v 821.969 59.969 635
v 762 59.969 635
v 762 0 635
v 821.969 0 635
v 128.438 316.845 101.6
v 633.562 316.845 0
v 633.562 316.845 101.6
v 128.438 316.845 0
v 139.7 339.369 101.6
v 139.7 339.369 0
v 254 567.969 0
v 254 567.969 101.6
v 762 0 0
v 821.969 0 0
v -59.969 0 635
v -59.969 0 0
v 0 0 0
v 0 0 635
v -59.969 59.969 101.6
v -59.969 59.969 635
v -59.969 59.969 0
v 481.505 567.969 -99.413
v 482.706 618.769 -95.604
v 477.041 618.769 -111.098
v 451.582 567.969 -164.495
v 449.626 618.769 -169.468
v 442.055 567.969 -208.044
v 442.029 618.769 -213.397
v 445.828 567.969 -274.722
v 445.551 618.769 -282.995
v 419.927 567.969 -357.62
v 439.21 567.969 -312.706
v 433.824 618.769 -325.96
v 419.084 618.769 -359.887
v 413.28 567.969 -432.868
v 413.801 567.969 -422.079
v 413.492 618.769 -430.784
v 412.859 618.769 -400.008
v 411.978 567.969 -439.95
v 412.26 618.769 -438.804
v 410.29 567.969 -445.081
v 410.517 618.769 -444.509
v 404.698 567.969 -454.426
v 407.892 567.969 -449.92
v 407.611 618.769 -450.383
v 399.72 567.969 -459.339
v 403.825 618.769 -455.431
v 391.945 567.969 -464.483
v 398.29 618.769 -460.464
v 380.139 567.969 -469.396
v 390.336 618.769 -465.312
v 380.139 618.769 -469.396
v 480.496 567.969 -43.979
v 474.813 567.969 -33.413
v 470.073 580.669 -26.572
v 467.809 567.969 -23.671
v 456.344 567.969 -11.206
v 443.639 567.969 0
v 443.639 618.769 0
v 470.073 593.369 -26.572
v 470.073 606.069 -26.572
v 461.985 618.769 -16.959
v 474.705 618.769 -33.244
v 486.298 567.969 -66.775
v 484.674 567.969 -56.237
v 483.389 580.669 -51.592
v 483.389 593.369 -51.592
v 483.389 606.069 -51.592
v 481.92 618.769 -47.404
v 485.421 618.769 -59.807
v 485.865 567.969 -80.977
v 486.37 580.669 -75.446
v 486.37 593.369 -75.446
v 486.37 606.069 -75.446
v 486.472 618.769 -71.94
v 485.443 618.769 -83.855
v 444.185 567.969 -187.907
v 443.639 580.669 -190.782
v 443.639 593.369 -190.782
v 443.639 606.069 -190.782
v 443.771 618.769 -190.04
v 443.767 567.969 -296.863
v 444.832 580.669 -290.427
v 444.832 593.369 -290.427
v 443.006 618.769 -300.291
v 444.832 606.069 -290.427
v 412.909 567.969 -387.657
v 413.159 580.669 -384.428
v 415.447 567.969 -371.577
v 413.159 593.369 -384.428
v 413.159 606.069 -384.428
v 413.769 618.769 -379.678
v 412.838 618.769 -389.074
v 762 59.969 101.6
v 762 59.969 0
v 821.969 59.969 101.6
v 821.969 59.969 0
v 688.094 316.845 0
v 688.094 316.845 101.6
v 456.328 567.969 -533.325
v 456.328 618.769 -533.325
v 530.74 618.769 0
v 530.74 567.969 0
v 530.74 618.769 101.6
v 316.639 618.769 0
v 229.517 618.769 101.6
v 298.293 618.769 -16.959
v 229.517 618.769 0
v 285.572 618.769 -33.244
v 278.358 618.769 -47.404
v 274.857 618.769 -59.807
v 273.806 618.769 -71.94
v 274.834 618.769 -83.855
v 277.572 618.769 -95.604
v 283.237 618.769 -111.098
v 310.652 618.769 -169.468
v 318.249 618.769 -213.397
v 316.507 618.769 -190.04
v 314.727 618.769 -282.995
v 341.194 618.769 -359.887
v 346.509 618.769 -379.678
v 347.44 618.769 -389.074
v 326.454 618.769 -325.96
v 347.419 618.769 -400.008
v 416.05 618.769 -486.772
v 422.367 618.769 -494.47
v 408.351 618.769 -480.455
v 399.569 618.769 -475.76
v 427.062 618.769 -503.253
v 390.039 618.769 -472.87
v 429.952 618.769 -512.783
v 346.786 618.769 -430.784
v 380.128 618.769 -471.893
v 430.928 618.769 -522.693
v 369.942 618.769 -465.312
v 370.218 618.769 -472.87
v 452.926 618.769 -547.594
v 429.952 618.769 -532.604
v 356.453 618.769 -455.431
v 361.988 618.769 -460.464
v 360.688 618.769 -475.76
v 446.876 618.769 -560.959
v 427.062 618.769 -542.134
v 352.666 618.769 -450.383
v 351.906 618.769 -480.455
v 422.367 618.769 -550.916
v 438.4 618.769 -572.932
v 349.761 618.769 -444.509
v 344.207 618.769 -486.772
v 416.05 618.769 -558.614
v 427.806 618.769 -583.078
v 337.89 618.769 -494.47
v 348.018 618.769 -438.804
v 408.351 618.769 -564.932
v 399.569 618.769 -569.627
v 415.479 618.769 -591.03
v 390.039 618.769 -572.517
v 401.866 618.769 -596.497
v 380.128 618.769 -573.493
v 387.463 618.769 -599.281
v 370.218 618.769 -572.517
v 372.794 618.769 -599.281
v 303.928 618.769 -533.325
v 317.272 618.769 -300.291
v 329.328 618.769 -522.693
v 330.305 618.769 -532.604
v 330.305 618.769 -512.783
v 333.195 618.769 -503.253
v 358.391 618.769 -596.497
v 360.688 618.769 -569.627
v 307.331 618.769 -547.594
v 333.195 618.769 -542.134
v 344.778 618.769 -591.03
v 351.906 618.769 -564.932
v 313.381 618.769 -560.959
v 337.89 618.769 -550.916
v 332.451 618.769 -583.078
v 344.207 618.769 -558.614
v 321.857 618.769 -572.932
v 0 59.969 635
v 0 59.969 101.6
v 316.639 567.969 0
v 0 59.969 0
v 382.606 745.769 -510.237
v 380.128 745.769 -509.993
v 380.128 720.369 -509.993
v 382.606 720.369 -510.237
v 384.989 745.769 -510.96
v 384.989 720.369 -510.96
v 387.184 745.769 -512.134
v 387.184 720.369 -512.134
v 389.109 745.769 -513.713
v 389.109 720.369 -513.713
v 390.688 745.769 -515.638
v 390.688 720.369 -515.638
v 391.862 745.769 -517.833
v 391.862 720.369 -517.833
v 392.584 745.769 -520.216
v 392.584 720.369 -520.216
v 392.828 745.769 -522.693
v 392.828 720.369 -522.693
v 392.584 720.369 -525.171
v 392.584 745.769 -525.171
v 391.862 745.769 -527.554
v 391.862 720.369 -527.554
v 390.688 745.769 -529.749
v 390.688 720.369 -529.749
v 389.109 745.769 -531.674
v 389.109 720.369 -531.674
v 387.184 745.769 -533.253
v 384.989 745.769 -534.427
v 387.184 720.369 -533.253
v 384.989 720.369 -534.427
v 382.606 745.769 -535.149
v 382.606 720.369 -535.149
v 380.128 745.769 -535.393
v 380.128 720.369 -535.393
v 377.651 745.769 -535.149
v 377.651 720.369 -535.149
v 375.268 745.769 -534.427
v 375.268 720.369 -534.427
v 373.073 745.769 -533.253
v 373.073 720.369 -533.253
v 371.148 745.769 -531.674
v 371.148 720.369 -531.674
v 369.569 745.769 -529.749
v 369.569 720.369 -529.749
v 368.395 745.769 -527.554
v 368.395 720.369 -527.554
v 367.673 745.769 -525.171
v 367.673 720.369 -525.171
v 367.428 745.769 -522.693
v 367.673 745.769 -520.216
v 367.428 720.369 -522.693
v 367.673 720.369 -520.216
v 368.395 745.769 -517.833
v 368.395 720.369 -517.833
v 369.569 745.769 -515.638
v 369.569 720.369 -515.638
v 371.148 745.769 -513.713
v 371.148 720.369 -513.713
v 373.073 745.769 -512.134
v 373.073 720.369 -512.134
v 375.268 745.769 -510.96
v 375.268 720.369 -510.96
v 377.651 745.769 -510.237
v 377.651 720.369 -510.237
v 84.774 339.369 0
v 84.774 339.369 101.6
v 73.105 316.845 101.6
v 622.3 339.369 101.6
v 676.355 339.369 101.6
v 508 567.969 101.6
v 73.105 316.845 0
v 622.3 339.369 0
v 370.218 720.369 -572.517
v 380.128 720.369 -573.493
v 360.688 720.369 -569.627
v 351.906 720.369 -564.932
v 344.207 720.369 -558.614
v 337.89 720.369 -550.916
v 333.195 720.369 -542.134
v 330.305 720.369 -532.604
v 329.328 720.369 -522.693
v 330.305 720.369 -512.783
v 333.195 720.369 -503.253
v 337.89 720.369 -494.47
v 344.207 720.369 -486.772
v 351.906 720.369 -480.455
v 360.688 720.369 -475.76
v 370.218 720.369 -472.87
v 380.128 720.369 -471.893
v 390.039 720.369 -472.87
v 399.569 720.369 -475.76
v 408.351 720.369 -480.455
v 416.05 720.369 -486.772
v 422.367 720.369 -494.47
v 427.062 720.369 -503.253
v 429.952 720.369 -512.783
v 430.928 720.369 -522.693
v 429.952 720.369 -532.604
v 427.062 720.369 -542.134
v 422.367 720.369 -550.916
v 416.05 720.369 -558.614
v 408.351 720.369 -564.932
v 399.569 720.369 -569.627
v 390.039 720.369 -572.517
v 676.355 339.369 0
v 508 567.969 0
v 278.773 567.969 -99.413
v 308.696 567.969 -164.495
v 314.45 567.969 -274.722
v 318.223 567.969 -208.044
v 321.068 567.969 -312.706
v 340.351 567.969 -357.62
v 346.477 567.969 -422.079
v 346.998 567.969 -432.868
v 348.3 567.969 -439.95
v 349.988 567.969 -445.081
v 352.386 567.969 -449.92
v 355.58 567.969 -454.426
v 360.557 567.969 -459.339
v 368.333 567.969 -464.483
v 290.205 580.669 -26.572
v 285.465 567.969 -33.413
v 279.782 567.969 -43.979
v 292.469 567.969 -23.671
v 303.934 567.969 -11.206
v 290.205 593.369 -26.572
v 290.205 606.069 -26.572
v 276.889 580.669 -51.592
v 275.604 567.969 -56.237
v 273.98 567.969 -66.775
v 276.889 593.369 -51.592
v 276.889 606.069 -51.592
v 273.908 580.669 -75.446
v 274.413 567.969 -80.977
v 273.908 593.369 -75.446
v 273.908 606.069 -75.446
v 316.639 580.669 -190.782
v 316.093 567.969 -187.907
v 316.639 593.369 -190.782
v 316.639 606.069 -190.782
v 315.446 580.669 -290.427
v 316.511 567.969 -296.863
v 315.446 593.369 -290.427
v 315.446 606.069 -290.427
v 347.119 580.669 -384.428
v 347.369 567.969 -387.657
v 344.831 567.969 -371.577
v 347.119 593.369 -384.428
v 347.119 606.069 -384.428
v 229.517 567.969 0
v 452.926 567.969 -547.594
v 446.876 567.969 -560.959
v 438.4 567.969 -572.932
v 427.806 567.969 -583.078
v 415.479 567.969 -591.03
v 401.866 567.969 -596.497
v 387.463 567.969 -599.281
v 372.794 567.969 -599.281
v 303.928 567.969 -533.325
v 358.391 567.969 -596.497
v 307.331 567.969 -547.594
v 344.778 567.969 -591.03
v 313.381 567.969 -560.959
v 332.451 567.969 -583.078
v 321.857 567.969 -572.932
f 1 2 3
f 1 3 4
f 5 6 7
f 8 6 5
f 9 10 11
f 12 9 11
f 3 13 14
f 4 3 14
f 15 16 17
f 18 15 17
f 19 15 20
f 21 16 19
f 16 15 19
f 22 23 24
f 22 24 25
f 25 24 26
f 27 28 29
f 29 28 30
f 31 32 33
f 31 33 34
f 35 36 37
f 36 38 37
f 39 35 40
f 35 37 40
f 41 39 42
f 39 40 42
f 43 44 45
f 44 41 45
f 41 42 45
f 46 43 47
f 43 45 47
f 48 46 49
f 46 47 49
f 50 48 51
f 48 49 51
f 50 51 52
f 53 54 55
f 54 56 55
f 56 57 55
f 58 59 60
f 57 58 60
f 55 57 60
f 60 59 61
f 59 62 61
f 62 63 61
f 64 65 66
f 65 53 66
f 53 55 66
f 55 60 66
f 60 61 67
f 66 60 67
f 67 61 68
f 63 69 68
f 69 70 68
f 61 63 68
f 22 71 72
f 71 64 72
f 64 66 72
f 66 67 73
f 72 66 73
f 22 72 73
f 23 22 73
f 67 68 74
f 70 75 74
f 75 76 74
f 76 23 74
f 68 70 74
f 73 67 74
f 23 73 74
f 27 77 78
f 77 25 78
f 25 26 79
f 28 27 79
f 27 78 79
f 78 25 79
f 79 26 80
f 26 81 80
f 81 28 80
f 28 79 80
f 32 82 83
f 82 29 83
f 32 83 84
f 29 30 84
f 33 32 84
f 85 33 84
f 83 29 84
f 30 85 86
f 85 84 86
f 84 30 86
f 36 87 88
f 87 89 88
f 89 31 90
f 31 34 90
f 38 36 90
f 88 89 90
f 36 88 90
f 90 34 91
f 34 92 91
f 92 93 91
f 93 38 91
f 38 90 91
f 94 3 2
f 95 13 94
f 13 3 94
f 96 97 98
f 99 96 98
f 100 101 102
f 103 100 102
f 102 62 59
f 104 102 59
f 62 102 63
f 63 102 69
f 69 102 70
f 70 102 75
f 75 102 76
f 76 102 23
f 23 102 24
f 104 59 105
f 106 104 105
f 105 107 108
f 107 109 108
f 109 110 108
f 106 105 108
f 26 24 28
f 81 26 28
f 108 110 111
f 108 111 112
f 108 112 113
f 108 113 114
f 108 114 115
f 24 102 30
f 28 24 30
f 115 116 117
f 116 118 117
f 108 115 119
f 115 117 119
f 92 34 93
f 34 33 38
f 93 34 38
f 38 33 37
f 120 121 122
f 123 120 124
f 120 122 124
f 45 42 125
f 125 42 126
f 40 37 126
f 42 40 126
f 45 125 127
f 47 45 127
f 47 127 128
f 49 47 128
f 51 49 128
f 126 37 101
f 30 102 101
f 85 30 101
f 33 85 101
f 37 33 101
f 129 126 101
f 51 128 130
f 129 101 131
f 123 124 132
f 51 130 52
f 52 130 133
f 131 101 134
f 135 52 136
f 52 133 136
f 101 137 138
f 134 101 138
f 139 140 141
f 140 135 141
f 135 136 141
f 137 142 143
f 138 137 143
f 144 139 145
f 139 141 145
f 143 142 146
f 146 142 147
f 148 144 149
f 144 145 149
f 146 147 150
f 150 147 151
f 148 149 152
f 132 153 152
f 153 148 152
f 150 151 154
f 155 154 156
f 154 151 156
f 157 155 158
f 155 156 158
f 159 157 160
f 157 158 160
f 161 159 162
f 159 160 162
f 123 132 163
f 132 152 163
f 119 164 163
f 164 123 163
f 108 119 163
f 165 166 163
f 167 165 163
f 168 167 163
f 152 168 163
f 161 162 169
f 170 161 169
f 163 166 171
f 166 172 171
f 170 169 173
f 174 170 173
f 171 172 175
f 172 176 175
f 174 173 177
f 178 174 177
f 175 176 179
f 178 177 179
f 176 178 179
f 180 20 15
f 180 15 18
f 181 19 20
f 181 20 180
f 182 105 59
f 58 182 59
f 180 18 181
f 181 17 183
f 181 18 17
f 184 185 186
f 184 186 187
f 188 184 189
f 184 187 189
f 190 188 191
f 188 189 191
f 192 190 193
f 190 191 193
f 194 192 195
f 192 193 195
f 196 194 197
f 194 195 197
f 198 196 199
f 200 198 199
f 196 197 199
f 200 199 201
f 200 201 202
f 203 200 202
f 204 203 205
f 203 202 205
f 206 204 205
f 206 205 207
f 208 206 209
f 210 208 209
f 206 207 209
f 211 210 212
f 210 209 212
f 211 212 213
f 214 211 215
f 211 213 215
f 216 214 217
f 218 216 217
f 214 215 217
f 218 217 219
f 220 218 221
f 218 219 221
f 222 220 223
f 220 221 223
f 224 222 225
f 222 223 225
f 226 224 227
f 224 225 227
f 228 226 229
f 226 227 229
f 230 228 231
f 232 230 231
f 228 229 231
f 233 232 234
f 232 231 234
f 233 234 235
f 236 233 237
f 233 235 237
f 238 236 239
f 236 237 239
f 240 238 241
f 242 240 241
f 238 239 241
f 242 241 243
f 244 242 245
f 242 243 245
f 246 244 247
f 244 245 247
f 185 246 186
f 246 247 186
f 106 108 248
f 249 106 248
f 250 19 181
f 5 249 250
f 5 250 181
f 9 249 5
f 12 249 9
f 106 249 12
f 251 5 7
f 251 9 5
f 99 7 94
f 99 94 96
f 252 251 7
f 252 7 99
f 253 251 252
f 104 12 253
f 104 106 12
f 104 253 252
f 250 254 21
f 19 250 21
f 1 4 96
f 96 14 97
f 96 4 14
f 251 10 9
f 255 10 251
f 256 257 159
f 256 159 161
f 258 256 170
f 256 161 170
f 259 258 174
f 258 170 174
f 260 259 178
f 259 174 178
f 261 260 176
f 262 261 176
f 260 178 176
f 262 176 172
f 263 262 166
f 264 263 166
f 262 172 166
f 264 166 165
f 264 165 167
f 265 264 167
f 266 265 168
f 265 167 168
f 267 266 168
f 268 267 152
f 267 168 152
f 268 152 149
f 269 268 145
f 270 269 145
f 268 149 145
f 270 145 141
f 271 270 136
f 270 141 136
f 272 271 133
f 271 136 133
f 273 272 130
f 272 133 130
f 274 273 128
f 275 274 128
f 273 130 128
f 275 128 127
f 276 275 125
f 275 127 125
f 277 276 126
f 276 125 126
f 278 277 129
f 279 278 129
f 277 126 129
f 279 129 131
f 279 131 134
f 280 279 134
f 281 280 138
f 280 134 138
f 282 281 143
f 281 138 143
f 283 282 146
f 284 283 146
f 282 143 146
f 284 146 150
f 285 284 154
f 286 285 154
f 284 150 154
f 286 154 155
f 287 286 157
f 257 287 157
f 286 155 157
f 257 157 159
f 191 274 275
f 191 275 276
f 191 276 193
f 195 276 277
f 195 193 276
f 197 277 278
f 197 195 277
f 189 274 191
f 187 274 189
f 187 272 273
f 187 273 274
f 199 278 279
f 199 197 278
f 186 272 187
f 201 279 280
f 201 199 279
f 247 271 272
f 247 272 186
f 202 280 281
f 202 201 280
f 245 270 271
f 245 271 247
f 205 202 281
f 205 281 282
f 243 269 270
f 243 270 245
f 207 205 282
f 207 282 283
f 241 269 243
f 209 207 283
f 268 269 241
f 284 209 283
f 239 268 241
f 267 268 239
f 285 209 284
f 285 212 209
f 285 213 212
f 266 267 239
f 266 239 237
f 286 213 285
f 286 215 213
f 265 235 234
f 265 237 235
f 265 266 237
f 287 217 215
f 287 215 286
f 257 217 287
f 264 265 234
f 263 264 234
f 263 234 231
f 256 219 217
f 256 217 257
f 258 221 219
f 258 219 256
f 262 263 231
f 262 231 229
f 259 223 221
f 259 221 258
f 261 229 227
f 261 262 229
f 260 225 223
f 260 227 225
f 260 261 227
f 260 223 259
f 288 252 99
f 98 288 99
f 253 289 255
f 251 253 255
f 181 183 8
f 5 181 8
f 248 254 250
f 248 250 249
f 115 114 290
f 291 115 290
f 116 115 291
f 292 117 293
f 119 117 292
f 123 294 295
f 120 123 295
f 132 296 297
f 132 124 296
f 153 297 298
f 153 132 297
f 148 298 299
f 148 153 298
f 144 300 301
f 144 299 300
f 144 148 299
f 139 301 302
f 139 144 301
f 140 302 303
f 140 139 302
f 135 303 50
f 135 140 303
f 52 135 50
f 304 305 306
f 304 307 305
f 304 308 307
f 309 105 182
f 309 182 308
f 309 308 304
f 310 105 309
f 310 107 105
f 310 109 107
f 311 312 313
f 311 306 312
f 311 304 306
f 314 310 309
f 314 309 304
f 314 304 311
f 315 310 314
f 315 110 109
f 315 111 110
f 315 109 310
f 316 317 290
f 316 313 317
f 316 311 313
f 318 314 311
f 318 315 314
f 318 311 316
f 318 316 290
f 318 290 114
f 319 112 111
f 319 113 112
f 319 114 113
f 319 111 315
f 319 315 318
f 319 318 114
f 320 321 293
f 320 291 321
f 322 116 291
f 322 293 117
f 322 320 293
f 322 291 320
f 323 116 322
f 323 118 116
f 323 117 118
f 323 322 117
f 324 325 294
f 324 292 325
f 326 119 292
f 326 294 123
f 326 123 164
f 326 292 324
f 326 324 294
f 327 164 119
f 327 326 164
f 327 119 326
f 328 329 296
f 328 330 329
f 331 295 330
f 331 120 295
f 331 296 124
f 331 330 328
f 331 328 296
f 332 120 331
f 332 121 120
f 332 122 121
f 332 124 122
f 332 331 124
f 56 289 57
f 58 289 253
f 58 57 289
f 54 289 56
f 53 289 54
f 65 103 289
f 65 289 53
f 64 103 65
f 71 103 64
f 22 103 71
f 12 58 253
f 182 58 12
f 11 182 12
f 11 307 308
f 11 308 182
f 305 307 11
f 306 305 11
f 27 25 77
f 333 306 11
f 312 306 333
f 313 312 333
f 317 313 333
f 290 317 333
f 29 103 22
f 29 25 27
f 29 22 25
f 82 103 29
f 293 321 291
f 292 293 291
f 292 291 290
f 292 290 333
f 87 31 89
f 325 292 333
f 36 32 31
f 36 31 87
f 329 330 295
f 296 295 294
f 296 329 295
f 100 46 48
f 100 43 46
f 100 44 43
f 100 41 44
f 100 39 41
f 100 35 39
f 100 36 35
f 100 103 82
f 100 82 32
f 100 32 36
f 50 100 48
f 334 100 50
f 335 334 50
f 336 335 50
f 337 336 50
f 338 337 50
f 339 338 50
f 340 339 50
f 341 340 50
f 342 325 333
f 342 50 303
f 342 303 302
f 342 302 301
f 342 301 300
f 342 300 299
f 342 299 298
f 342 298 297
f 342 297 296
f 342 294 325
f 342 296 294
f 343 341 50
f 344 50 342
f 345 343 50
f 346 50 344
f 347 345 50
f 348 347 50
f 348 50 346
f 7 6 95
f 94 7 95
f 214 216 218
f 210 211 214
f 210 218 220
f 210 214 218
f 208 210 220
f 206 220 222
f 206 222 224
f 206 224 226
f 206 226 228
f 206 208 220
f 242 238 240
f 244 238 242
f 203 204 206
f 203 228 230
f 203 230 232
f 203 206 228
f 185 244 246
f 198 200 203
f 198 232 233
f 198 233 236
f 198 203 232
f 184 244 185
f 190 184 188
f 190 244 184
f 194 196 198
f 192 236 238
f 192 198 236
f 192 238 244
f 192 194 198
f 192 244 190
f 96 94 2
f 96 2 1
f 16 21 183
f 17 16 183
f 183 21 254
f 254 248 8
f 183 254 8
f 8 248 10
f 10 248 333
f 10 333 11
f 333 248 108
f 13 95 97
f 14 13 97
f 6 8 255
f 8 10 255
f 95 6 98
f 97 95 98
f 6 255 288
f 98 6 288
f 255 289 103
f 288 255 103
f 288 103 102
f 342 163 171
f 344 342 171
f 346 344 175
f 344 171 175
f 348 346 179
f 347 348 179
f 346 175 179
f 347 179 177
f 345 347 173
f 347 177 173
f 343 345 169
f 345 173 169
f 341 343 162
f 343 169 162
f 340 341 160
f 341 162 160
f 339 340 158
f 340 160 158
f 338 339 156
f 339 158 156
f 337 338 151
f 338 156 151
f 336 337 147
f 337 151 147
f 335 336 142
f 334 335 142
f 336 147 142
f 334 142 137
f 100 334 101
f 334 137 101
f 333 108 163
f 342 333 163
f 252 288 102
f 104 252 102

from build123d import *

# Parameters (mm, degrees)
SKETCH1_W             = 59.9694
SKETCH1_H             = 59.9694
BOSS_EXTRUDE1_DEPTH   = 635
BOSS_EXTRUDE1_2_DEPTH = 635
BOSS_EXTRUDE2_DEPTH   = 101.6
BOSS_EXTRUDE3_DEPTH   = 101.6
BOSS_EXTRUDE4_DEPTH   = 50.8
CUT_EXTRUDE1_DEPTH    = 1210.022028299
SKETCH10_R            = 50.8
BOSS_EXTRUDE5_DEPTH   = 101.6
SKETCH11_R            = 12.7
BOSS_EXTRUDE6_DEPTH   = 25.4


with BuildPart() as part:
    # Sketch1 → Boss-Extrude1 (new body)
    with BuildSketch(Plane.XY):
        with Locations((791.9847, 29.9847)):
            Rectangle(SKETCH1_W, SKETCH1_H)
    extrude(amount=BOSS_EXTRUDE1_DEPTH)



with BuildPart() as body_2:
    # Sketch1 → Boss-Extrude1 2 (new body)
    with BuildSketch(Plane.XY):
        with Locations((-29.9847, 29.9847)):
            Rectangle(SKETCH1_W, SKETCH1_H)
    extrude(amount=BOSS_EXTRUDE1_2_DEPTH)


with BuildPart() as part_1:
    add(part.part)

    add(body_2.part)  # Boss-Extrude2 merges body 2
    # Sketch5 → Boss-Extrude2 (add)
    with BuildSketch(Plane.XY):
        Polygon((254, 567.9694), (508, 567.9694), (762, 59.9694), (821.9694, 59.9694), (530.740058053, 618.7694), (229.51694, 618.7694), (-59.9694, 59.9694), (0, 59.9694), align=None)
    extrude(amount=BOSS_EXTRUDE2_DEPTH)

    # Sketch6 → Boss-Extrude3 (add)
    with BuildSketch(Plane.XY):
        Polygon((84.77377, 339.3694), (676.354729026, 339.3694), (688.093813572, 316.84488238), (73.104943647, 316.84488238), align=None)
    extrude(amount=BOSS_EXTRUDE3_DEPTH)

    # Sketch7 → Boss-Extrude4 (add)
    with BuildSketch(Plane(origin=(0, 618.7694, 0), x_dir=(1, 0, 0), z_dir=(0, 1, 0))):
        with BuildLine():
            Line((229.51694, 0), (303.928499026, 533.325167084))
            ThreePointArc((303.928499026, 533.325167084), (380.128499026, 599.631566556), (456.328499026, 533.325167084))
            Line((456.328499026, 533.325167084), (530.740058053, 0))
            Line((530.740058053, 0), (229.51694, 0))
        make_face()
    extrude(amount=-BOSS_EXTRUDE4_DEPTH)

    # Sketch9 → Cut-Extrude1 (cut, through all)
    with BuildSketch(Plane(origin=(0, 618.7694, 0), x_dir=(1, 0, 0), z_dir=(0, 1, 0))):
        with BuildLine():
            Line((316.63894, 0), (443.63894, 0))
            add(Edge.make_bspline(
                [(443.63894, 0), (534.092966377, 73.272550309), (412.87552259, 153.810052423), (462.148891497, 296.07624868), (393.499435083, 382.146243658), (427.489547729, 454.141623856), (380.13894, 469.395677589)],
                knots=[0, 0, 0, 0, 0.403522035, 0.617987336, 0.803164244, 1, 1, 1, 1], degree=3))
            add(Edge.make_bspline(
                [(316.63894, 0), (226.184913623, 73.272550309), (347.40235741, 153.810052423), (298.128988503, 296.07624868), (366.778444917, 382.146243658), (332.788332271, 454.141623856), (380.13894, 469.395677589)],
                knots=[0, 0, 0, 0, 0.403522035, 0.617987336, 0.803164244, 1, 1, 1, 1], degree=3))
        make_face()
    extrude(amount=-CUT_EXTRUDE1_DEPTH, mode=Mode.SUBTRACT)

    # Sketch10 → Boss-Extrude5 (add)
    with BuildSketch(Plane(origin=(0, 618.7694, 0), x_dir=(1, 0, 0), z_dir=(0, 1, 0))):
        with Locations(Location((380.128499026, 522.693452798, 0), (0, 0, 90))):
            Circle(SKETCH10_R)
    extrude(amount=BOSS_EXTRUDE5_DEPTH)

    # Sketch11 → Boss-Extrude6 (add)
    with BuildSketch(Plane(origin=(0, 720.3694, 0), x_dir=(1, 0, 0), z_dir=(0, 1, 0))):
        with Locations(Location((380.128499026, 522.693452798, 0), (0, 0, 270))):
            Circle(SKETCH11_R)
    extrude(amount=BOSS_EXTRUDE6_DEPTH)


solid = part_1.part
